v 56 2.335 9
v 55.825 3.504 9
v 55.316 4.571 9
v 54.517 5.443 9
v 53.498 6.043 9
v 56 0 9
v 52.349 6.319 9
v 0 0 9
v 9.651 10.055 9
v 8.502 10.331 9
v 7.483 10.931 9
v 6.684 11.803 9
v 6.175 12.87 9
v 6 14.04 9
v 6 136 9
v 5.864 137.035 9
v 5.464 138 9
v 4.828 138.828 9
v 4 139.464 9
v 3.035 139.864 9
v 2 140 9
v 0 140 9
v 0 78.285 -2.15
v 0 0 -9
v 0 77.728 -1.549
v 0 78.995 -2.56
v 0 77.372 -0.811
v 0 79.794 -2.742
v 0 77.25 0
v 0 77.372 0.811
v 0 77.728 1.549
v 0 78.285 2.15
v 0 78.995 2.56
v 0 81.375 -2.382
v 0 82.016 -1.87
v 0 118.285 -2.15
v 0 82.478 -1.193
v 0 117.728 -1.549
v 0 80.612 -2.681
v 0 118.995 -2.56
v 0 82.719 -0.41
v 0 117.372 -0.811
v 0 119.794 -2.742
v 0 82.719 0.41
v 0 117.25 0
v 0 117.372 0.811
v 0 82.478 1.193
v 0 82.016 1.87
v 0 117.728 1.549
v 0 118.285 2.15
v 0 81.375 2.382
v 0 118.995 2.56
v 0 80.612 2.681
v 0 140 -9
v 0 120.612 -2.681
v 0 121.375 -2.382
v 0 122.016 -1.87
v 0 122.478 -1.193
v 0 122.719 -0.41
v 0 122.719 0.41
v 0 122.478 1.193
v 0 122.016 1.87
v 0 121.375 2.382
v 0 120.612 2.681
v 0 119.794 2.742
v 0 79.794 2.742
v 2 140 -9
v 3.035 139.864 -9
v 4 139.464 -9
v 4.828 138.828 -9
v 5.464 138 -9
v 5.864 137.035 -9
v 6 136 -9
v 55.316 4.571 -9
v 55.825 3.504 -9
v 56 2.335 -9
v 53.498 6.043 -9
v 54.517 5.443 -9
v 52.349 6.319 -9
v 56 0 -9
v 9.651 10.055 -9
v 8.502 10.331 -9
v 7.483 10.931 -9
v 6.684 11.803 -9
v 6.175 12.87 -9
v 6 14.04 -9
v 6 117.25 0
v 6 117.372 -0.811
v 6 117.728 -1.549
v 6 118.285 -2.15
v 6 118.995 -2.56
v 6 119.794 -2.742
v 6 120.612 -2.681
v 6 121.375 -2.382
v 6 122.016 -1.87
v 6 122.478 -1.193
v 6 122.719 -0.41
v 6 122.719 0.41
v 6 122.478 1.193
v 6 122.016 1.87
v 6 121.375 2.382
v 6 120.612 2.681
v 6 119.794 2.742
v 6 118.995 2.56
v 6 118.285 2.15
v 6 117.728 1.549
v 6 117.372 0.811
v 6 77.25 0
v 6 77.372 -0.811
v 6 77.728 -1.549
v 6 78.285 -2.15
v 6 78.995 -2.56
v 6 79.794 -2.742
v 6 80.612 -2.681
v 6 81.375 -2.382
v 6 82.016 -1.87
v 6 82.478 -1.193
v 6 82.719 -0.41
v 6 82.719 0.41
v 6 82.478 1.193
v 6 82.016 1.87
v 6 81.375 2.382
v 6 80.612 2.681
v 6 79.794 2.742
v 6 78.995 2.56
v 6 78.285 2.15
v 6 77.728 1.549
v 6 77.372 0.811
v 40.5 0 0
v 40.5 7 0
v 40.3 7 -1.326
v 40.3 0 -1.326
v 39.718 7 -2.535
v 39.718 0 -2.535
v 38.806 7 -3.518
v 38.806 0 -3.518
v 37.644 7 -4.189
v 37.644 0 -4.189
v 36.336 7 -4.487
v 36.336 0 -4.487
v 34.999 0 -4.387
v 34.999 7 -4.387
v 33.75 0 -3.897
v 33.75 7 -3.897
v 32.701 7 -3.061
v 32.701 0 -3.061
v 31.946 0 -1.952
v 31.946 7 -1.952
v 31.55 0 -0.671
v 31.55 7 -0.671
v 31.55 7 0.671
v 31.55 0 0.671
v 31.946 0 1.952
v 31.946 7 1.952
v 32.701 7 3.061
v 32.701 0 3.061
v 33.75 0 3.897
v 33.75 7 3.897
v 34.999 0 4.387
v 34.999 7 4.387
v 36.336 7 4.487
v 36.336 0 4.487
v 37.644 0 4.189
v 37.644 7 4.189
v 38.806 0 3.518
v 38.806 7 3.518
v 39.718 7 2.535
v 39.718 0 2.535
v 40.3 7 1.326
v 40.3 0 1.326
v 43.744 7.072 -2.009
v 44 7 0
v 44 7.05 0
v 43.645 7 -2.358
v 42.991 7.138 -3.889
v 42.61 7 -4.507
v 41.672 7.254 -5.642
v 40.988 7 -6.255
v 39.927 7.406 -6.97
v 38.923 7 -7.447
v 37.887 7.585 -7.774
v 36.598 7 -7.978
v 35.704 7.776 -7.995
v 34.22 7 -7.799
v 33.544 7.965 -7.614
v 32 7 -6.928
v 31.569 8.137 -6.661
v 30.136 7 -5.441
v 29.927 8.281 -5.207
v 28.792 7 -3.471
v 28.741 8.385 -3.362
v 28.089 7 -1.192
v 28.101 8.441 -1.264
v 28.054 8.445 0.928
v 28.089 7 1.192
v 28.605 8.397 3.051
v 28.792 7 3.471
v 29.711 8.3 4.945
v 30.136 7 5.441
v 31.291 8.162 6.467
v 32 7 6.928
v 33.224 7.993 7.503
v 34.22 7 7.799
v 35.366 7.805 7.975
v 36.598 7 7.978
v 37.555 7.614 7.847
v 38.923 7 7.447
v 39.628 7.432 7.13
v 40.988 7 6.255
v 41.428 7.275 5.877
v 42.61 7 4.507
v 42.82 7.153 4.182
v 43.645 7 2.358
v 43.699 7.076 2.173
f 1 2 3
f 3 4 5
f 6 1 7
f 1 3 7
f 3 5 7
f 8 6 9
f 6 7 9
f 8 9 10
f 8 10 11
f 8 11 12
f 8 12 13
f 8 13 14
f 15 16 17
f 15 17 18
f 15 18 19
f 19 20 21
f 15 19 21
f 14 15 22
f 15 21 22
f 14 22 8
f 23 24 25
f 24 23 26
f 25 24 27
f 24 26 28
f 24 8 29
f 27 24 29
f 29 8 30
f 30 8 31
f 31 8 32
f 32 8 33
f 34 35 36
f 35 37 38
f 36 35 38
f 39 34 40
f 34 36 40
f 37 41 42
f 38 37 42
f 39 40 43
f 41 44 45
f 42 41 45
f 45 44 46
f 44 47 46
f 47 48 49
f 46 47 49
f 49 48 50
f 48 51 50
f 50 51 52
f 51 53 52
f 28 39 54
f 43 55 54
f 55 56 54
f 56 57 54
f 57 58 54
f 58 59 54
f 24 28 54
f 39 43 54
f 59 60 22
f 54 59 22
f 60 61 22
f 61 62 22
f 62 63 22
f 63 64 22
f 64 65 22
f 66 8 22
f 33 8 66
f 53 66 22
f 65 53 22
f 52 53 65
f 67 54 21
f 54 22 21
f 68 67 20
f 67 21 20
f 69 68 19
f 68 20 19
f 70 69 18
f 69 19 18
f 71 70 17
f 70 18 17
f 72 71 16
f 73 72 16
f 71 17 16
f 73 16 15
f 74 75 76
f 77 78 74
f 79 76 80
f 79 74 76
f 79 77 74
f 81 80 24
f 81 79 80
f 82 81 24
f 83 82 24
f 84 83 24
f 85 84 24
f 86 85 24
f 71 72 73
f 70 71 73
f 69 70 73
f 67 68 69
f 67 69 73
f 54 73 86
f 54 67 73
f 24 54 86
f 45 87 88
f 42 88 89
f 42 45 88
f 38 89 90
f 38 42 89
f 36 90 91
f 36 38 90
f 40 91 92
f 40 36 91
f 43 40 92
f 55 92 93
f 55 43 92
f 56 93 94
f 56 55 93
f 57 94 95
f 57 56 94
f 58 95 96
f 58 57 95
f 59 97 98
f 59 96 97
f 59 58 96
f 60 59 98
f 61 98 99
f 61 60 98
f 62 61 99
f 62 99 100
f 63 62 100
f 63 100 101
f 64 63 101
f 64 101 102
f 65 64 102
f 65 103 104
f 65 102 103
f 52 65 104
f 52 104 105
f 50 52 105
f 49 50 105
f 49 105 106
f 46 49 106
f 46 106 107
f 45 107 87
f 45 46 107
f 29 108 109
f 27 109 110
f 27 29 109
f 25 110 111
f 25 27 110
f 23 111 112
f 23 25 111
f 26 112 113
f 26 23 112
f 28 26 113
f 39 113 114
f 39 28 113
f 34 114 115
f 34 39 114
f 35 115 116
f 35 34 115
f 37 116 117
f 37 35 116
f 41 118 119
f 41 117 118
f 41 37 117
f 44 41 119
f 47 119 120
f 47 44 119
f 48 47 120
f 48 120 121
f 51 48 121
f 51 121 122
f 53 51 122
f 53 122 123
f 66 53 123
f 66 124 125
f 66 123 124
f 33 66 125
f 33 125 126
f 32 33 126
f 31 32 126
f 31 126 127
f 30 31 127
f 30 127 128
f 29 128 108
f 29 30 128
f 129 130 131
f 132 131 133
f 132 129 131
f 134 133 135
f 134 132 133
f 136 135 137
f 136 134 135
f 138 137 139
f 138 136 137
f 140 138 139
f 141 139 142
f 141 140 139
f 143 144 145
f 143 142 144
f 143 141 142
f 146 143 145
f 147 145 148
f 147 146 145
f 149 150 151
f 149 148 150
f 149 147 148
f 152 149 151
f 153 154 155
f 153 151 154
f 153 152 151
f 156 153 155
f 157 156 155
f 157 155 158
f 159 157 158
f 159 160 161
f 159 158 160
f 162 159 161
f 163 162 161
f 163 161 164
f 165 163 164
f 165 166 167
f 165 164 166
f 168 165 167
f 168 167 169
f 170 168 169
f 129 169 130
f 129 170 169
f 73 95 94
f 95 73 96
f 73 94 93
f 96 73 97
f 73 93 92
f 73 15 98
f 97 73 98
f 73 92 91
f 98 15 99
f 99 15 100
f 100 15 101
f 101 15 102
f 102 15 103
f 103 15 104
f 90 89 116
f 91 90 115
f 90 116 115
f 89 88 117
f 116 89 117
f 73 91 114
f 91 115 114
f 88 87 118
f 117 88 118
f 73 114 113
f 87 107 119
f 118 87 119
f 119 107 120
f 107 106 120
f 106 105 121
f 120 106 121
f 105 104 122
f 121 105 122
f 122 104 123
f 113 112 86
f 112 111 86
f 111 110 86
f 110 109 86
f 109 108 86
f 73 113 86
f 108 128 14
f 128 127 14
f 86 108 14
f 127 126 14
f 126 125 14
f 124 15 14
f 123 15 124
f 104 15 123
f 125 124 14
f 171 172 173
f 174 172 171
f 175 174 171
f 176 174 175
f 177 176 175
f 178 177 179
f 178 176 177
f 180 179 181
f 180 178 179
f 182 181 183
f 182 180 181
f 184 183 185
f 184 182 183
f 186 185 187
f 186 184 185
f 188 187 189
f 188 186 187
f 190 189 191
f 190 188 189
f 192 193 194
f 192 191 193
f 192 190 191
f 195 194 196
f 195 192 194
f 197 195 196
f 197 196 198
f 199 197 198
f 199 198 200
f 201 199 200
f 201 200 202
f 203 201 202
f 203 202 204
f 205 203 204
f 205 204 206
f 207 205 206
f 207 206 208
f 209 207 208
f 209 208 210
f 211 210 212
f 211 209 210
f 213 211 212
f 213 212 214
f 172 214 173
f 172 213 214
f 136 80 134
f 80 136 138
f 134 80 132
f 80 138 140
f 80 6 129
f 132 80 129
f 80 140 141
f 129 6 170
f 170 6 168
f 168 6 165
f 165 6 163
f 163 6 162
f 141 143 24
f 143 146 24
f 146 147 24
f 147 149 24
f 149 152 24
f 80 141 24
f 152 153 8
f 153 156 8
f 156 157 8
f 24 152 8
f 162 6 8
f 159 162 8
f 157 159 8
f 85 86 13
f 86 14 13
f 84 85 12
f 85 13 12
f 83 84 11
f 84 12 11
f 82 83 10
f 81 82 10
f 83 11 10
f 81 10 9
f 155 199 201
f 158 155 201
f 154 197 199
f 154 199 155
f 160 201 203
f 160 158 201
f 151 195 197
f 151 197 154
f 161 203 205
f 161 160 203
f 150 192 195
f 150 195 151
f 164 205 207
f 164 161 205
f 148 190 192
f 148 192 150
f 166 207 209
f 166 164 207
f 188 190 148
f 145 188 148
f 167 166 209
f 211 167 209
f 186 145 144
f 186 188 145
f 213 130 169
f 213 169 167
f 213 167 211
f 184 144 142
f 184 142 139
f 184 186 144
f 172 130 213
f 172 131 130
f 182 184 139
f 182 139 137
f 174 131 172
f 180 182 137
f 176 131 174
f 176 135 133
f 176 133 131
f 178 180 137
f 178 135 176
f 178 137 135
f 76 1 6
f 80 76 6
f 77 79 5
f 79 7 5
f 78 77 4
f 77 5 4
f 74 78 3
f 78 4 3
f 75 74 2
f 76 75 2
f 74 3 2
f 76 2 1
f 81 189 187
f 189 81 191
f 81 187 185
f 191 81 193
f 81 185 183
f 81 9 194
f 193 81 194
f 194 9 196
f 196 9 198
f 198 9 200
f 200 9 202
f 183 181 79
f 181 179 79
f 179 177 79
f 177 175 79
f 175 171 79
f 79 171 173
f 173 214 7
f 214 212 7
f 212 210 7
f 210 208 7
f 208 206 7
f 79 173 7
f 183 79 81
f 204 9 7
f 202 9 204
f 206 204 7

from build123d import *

# Parameters (mm, degrees)
BOSS_EXTRUDE1_DEPTH = 9
SKETCH2_R           = 4.5
CUT_EXTRUDE1_DEPTH  = 152.052970841
CUT_EXTRUDE2_START  = 7
SKETCH3_R           = 8
CUT_EXTRUDE2_DEPTH  = 145.052970841
SKETCH4_R           = 2.75
CUT_EXTRUDE3_DEPTH  = 152.052970841


with BuildPart() as part:
    # Sketch1 → Boss-Extrude1 (new, symmetric)
    with BuildSketch(Plane.XY):
        with BuildLine():
            Line((0, 0), (0, 140))
            Line((0, 140), (2, 140))
            ThreePointArc((2, 140), (4.828427125, 138.828427125), (6, 136))
            Line((6, 136), (6, 14.039757872))
            ThreePointArc((6, 14.039757872), (7.050890653, 11.337397042), (9.651377029, 10.05497908))
            Line((9.651377029, 10.05497908), (52.348622971, 6.319454096))
            ThreePointArc((52.348622971, 6.319454096), (54.949109347, 5.037036134), (56, 2.334675304))
            Line((56, 2.334675304), (56, 0))
            Line((56, 0), (0, 0))
        make_face()
    extrude(amount=BOSS_EXTRUDE1_DEPTH, both=True)

    # Sketch2 → Cut-Extrude1 (cut, through all)
    with BuildSketch(Plane(origin=(0, 0, 0), x_dir=(1, 0, 0), z_dir=(0, 1, 0))):
        with Locations((36, 0)):
            Circle(SKETCH2_R)
    extrude(amount=CUT_EXTRUDE1_DEPTH, mode=Mode.SUBTRACT)

    # Sketch3 → Cut-Extrude2 (cut, through all)
    with BuildSketch(Plane(origin=(0, 0, 0), x_dir=(1, 0, 0), z_dir=(0, 1, 0)).offset(CUT_EXTRUDE2_START)):
        with Locations((36, 0)):
            Circle(SKETCH3_R)
    extrude(amount=CUT_EXTRUDE2_DEPTH, mode=Mode.SUBTRACT)

    # Sketch4 → Cut-Extrude3 (cut, through all)
    with BuildSketch(Plane(origin=(0, 0, 0), x_dir=(0, 0, -1), z_dir=(1, 0, 0))):
        with Locations(Location((0, 80, 0), (0, 0, 270))):
            Circle(SKETCH4_R)
        with Locations(Location((0, 120, 0), (0, 0, 270))):
            Circle(SKETCH4_R)
    extrude(amount=CUT_EXTRUDE3_DEPTH, mode=Mode.SUBTRACT)


solid = part.part
